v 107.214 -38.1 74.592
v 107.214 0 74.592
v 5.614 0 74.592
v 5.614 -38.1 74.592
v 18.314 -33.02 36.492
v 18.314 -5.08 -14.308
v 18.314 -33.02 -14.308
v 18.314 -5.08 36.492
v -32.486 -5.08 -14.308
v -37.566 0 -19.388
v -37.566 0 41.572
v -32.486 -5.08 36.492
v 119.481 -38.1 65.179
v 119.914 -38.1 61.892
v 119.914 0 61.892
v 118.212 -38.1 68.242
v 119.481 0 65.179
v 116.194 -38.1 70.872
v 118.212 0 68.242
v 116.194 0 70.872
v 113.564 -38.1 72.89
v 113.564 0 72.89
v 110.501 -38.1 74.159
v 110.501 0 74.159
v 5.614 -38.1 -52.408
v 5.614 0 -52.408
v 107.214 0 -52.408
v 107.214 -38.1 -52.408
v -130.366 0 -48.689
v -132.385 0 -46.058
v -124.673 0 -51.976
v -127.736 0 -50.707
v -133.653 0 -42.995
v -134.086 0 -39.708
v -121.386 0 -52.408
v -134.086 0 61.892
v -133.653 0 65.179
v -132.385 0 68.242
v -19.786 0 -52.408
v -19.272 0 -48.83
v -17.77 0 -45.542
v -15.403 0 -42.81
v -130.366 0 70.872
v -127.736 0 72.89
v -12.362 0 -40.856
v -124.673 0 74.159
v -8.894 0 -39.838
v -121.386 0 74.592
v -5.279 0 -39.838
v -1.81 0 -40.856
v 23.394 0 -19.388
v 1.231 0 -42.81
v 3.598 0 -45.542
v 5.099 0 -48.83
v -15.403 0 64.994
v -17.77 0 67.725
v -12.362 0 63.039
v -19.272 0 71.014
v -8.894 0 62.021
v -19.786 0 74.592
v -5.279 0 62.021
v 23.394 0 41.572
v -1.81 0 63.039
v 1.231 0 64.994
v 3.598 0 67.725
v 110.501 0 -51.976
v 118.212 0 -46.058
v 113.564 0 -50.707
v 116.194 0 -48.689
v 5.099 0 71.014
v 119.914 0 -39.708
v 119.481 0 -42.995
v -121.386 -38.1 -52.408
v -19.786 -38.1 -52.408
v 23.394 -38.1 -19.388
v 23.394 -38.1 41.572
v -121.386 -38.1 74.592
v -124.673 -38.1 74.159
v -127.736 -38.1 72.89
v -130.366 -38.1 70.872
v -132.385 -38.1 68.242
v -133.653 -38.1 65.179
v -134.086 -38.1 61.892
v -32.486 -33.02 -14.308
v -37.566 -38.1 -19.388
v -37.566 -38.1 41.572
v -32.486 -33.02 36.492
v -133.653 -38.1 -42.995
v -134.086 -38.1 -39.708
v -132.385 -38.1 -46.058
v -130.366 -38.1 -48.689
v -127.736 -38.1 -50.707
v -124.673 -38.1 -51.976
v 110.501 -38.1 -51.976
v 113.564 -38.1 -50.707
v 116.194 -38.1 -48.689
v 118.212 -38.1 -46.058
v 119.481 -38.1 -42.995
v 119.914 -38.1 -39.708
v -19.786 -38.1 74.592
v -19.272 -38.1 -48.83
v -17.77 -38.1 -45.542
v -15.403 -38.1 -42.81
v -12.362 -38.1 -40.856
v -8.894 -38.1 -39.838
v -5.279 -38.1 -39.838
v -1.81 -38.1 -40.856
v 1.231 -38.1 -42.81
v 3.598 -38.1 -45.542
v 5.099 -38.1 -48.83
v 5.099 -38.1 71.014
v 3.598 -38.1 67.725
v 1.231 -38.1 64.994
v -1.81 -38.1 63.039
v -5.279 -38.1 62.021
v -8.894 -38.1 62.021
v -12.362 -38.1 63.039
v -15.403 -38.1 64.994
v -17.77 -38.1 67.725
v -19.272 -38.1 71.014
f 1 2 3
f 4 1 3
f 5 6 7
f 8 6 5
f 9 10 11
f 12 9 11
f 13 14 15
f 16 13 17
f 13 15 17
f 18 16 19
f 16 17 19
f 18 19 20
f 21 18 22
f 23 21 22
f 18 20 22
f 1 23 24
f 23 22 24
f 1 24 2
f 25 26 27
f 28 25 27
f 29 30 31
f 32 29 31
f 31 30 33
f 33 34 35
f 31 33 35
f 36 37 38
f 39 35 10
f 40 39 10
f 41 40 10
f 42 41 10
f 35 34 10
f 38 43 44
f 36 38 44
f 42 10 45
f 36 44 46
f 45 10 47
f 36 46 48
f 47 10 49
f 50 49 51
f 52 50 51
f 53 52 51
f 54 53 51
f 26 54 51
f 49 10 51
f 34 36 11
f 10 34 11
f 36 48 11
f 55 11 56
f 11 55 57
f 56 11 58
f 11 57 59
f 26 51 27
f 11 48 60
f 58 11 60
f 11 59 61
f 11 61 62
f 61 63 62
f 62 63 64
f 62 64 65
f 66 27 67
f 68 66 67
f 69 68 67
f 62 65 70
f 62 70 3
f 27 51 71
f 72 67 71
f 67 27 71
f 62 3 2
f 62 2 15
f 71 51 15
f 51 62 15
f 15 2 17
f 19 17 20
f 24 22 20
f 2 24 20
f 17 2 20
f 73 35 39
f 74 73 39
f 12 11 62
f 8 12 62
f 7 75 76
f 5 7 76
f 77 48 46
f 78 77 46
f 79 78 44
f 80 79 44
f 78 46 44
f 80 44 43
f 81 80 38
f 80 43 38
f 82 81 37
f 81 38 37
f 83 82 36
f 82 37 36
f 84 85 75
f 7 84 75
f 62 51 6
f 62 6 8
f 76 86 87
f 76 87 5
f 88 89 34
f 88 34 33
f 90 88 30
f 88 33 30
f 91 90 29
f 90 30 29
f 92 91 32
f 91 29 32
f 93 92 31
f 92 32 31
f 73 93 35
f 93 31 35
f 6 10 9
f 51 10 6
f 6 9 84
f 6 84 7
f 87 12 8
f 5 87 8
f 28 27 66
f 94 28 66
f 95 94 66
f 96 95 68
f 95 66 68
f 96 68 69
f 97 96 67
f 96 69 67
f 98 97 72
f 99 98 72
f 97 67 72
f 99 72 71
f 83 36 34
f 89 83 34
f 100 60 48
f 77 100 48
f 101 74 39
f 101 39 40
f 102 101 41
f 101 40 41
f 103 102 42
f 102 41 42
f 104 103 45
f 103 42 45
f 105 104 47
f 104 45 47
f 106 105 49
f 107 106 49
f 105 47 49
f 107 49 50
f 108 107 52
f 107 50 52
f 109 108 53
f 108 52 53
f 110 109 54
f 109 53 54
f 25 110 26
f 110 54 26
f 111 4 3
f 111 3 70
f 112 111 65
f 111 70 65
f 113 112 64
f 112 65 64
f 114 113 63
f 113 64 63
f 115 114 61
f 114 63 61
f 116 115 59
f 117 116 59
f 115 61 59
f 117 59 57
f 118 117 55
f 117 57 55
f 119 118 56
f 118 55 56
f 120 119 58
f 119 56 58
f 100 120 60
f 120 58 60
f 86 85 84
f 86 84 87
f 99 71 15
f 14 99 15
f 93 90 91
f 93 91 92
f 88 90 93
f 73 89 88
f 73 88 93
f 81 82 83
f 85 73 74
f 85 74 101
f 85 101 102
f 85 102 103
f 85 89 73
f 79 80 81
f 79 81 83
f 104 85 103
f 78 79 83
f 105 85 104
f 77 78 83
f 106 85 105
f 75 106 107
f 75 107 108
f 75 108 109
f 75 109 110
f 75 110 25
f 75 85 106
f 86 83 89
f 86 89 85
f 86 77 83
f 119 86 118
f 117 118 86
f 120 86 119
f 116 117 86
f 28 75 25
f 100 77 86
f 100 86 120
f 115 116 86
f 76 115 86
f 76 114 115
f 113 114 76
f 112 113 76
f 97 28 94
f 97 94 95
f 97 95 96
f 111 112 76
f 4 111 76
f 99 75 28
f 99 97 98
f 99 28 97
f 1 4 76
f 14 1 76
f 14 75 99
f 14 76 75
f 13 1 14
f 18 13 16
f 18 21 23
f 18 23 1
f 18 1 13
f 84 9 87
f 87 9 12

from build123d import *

# Parameters (mm, degrees)
F0_W     = 50.8
F0_H     = 50.8
F1_DEPTH = 38.1
F2_SIZE  = 5.08


with BuildPart() as f1:
    # F0 (on Front) → F1 (new body)
    with BuildSketch(Plane.XZ):
        with BuildLine():
            ThreePointArc((-134.08614, -39.708438), (-130.366396, -48.688694), (-121.38614, -52.408438))
            Line((-121.38614, -52.408438), (-19.78614, -52.408438))
            ThreePointArc((-19.78614, -52.408438), (-7.08614, -39.708438), (5.61386, -52.408438))
            Line((5.61386, -52.408438), (107.21386, -52.408438))
            ThreePointArc((107.21386, -52.408438), (116.194116, -48.688694), (119.91386, -39.708438))
            Line((119.91386, -39.708438), (119.91386, 61.891562))
            ThreePointArc((119.91386, 61.891562), (116.194116, 70.871818), (107.21386, 74.591562))
            Line((107.21386, 74.591562), (5.61386, 74.591562))
            ThreePointArc((5.61386, 74.591562), (-7.08614, 61.891562), (-19.78614, 74.591562))
            Line((-19.78614, 74.591562), (-121.38614, 74.591562))
            ThreePointArc((-121.38614, 74.591562), (-130.366396, 70.871818), (-134.08614, 61.891562))
            Line((-134.08614, 61.891562), (-134.08614, -39.708438))
        make_face()
        with Locations((-7.08614, 11.091562)):
            Rectangle(F0_W, F0_H, mode=Mode.SUBTRACT)
    extrude(amount=F1_DEPTH)

    # F2
    f2_edges = [f1.edges().sort_by_distance(p)[0] for p in [
        (18.31386, -38.1, 11.091562),
        (-7.08614, -38.1, -14.308438),
        (-32.48614, -38.1, 11.091562),
        (-7.08614, -38.1, 36.491562),
        (-7.08614, 0, -14.308438),
        (-32.48614, 0, 11.091562),
        (18.31386, 0, 11.091562),
        (-7.08614, 0, 36.491562),
    ]]
    chamfer(f2_edges, length=F2_SIZE)


solid = f1.part
